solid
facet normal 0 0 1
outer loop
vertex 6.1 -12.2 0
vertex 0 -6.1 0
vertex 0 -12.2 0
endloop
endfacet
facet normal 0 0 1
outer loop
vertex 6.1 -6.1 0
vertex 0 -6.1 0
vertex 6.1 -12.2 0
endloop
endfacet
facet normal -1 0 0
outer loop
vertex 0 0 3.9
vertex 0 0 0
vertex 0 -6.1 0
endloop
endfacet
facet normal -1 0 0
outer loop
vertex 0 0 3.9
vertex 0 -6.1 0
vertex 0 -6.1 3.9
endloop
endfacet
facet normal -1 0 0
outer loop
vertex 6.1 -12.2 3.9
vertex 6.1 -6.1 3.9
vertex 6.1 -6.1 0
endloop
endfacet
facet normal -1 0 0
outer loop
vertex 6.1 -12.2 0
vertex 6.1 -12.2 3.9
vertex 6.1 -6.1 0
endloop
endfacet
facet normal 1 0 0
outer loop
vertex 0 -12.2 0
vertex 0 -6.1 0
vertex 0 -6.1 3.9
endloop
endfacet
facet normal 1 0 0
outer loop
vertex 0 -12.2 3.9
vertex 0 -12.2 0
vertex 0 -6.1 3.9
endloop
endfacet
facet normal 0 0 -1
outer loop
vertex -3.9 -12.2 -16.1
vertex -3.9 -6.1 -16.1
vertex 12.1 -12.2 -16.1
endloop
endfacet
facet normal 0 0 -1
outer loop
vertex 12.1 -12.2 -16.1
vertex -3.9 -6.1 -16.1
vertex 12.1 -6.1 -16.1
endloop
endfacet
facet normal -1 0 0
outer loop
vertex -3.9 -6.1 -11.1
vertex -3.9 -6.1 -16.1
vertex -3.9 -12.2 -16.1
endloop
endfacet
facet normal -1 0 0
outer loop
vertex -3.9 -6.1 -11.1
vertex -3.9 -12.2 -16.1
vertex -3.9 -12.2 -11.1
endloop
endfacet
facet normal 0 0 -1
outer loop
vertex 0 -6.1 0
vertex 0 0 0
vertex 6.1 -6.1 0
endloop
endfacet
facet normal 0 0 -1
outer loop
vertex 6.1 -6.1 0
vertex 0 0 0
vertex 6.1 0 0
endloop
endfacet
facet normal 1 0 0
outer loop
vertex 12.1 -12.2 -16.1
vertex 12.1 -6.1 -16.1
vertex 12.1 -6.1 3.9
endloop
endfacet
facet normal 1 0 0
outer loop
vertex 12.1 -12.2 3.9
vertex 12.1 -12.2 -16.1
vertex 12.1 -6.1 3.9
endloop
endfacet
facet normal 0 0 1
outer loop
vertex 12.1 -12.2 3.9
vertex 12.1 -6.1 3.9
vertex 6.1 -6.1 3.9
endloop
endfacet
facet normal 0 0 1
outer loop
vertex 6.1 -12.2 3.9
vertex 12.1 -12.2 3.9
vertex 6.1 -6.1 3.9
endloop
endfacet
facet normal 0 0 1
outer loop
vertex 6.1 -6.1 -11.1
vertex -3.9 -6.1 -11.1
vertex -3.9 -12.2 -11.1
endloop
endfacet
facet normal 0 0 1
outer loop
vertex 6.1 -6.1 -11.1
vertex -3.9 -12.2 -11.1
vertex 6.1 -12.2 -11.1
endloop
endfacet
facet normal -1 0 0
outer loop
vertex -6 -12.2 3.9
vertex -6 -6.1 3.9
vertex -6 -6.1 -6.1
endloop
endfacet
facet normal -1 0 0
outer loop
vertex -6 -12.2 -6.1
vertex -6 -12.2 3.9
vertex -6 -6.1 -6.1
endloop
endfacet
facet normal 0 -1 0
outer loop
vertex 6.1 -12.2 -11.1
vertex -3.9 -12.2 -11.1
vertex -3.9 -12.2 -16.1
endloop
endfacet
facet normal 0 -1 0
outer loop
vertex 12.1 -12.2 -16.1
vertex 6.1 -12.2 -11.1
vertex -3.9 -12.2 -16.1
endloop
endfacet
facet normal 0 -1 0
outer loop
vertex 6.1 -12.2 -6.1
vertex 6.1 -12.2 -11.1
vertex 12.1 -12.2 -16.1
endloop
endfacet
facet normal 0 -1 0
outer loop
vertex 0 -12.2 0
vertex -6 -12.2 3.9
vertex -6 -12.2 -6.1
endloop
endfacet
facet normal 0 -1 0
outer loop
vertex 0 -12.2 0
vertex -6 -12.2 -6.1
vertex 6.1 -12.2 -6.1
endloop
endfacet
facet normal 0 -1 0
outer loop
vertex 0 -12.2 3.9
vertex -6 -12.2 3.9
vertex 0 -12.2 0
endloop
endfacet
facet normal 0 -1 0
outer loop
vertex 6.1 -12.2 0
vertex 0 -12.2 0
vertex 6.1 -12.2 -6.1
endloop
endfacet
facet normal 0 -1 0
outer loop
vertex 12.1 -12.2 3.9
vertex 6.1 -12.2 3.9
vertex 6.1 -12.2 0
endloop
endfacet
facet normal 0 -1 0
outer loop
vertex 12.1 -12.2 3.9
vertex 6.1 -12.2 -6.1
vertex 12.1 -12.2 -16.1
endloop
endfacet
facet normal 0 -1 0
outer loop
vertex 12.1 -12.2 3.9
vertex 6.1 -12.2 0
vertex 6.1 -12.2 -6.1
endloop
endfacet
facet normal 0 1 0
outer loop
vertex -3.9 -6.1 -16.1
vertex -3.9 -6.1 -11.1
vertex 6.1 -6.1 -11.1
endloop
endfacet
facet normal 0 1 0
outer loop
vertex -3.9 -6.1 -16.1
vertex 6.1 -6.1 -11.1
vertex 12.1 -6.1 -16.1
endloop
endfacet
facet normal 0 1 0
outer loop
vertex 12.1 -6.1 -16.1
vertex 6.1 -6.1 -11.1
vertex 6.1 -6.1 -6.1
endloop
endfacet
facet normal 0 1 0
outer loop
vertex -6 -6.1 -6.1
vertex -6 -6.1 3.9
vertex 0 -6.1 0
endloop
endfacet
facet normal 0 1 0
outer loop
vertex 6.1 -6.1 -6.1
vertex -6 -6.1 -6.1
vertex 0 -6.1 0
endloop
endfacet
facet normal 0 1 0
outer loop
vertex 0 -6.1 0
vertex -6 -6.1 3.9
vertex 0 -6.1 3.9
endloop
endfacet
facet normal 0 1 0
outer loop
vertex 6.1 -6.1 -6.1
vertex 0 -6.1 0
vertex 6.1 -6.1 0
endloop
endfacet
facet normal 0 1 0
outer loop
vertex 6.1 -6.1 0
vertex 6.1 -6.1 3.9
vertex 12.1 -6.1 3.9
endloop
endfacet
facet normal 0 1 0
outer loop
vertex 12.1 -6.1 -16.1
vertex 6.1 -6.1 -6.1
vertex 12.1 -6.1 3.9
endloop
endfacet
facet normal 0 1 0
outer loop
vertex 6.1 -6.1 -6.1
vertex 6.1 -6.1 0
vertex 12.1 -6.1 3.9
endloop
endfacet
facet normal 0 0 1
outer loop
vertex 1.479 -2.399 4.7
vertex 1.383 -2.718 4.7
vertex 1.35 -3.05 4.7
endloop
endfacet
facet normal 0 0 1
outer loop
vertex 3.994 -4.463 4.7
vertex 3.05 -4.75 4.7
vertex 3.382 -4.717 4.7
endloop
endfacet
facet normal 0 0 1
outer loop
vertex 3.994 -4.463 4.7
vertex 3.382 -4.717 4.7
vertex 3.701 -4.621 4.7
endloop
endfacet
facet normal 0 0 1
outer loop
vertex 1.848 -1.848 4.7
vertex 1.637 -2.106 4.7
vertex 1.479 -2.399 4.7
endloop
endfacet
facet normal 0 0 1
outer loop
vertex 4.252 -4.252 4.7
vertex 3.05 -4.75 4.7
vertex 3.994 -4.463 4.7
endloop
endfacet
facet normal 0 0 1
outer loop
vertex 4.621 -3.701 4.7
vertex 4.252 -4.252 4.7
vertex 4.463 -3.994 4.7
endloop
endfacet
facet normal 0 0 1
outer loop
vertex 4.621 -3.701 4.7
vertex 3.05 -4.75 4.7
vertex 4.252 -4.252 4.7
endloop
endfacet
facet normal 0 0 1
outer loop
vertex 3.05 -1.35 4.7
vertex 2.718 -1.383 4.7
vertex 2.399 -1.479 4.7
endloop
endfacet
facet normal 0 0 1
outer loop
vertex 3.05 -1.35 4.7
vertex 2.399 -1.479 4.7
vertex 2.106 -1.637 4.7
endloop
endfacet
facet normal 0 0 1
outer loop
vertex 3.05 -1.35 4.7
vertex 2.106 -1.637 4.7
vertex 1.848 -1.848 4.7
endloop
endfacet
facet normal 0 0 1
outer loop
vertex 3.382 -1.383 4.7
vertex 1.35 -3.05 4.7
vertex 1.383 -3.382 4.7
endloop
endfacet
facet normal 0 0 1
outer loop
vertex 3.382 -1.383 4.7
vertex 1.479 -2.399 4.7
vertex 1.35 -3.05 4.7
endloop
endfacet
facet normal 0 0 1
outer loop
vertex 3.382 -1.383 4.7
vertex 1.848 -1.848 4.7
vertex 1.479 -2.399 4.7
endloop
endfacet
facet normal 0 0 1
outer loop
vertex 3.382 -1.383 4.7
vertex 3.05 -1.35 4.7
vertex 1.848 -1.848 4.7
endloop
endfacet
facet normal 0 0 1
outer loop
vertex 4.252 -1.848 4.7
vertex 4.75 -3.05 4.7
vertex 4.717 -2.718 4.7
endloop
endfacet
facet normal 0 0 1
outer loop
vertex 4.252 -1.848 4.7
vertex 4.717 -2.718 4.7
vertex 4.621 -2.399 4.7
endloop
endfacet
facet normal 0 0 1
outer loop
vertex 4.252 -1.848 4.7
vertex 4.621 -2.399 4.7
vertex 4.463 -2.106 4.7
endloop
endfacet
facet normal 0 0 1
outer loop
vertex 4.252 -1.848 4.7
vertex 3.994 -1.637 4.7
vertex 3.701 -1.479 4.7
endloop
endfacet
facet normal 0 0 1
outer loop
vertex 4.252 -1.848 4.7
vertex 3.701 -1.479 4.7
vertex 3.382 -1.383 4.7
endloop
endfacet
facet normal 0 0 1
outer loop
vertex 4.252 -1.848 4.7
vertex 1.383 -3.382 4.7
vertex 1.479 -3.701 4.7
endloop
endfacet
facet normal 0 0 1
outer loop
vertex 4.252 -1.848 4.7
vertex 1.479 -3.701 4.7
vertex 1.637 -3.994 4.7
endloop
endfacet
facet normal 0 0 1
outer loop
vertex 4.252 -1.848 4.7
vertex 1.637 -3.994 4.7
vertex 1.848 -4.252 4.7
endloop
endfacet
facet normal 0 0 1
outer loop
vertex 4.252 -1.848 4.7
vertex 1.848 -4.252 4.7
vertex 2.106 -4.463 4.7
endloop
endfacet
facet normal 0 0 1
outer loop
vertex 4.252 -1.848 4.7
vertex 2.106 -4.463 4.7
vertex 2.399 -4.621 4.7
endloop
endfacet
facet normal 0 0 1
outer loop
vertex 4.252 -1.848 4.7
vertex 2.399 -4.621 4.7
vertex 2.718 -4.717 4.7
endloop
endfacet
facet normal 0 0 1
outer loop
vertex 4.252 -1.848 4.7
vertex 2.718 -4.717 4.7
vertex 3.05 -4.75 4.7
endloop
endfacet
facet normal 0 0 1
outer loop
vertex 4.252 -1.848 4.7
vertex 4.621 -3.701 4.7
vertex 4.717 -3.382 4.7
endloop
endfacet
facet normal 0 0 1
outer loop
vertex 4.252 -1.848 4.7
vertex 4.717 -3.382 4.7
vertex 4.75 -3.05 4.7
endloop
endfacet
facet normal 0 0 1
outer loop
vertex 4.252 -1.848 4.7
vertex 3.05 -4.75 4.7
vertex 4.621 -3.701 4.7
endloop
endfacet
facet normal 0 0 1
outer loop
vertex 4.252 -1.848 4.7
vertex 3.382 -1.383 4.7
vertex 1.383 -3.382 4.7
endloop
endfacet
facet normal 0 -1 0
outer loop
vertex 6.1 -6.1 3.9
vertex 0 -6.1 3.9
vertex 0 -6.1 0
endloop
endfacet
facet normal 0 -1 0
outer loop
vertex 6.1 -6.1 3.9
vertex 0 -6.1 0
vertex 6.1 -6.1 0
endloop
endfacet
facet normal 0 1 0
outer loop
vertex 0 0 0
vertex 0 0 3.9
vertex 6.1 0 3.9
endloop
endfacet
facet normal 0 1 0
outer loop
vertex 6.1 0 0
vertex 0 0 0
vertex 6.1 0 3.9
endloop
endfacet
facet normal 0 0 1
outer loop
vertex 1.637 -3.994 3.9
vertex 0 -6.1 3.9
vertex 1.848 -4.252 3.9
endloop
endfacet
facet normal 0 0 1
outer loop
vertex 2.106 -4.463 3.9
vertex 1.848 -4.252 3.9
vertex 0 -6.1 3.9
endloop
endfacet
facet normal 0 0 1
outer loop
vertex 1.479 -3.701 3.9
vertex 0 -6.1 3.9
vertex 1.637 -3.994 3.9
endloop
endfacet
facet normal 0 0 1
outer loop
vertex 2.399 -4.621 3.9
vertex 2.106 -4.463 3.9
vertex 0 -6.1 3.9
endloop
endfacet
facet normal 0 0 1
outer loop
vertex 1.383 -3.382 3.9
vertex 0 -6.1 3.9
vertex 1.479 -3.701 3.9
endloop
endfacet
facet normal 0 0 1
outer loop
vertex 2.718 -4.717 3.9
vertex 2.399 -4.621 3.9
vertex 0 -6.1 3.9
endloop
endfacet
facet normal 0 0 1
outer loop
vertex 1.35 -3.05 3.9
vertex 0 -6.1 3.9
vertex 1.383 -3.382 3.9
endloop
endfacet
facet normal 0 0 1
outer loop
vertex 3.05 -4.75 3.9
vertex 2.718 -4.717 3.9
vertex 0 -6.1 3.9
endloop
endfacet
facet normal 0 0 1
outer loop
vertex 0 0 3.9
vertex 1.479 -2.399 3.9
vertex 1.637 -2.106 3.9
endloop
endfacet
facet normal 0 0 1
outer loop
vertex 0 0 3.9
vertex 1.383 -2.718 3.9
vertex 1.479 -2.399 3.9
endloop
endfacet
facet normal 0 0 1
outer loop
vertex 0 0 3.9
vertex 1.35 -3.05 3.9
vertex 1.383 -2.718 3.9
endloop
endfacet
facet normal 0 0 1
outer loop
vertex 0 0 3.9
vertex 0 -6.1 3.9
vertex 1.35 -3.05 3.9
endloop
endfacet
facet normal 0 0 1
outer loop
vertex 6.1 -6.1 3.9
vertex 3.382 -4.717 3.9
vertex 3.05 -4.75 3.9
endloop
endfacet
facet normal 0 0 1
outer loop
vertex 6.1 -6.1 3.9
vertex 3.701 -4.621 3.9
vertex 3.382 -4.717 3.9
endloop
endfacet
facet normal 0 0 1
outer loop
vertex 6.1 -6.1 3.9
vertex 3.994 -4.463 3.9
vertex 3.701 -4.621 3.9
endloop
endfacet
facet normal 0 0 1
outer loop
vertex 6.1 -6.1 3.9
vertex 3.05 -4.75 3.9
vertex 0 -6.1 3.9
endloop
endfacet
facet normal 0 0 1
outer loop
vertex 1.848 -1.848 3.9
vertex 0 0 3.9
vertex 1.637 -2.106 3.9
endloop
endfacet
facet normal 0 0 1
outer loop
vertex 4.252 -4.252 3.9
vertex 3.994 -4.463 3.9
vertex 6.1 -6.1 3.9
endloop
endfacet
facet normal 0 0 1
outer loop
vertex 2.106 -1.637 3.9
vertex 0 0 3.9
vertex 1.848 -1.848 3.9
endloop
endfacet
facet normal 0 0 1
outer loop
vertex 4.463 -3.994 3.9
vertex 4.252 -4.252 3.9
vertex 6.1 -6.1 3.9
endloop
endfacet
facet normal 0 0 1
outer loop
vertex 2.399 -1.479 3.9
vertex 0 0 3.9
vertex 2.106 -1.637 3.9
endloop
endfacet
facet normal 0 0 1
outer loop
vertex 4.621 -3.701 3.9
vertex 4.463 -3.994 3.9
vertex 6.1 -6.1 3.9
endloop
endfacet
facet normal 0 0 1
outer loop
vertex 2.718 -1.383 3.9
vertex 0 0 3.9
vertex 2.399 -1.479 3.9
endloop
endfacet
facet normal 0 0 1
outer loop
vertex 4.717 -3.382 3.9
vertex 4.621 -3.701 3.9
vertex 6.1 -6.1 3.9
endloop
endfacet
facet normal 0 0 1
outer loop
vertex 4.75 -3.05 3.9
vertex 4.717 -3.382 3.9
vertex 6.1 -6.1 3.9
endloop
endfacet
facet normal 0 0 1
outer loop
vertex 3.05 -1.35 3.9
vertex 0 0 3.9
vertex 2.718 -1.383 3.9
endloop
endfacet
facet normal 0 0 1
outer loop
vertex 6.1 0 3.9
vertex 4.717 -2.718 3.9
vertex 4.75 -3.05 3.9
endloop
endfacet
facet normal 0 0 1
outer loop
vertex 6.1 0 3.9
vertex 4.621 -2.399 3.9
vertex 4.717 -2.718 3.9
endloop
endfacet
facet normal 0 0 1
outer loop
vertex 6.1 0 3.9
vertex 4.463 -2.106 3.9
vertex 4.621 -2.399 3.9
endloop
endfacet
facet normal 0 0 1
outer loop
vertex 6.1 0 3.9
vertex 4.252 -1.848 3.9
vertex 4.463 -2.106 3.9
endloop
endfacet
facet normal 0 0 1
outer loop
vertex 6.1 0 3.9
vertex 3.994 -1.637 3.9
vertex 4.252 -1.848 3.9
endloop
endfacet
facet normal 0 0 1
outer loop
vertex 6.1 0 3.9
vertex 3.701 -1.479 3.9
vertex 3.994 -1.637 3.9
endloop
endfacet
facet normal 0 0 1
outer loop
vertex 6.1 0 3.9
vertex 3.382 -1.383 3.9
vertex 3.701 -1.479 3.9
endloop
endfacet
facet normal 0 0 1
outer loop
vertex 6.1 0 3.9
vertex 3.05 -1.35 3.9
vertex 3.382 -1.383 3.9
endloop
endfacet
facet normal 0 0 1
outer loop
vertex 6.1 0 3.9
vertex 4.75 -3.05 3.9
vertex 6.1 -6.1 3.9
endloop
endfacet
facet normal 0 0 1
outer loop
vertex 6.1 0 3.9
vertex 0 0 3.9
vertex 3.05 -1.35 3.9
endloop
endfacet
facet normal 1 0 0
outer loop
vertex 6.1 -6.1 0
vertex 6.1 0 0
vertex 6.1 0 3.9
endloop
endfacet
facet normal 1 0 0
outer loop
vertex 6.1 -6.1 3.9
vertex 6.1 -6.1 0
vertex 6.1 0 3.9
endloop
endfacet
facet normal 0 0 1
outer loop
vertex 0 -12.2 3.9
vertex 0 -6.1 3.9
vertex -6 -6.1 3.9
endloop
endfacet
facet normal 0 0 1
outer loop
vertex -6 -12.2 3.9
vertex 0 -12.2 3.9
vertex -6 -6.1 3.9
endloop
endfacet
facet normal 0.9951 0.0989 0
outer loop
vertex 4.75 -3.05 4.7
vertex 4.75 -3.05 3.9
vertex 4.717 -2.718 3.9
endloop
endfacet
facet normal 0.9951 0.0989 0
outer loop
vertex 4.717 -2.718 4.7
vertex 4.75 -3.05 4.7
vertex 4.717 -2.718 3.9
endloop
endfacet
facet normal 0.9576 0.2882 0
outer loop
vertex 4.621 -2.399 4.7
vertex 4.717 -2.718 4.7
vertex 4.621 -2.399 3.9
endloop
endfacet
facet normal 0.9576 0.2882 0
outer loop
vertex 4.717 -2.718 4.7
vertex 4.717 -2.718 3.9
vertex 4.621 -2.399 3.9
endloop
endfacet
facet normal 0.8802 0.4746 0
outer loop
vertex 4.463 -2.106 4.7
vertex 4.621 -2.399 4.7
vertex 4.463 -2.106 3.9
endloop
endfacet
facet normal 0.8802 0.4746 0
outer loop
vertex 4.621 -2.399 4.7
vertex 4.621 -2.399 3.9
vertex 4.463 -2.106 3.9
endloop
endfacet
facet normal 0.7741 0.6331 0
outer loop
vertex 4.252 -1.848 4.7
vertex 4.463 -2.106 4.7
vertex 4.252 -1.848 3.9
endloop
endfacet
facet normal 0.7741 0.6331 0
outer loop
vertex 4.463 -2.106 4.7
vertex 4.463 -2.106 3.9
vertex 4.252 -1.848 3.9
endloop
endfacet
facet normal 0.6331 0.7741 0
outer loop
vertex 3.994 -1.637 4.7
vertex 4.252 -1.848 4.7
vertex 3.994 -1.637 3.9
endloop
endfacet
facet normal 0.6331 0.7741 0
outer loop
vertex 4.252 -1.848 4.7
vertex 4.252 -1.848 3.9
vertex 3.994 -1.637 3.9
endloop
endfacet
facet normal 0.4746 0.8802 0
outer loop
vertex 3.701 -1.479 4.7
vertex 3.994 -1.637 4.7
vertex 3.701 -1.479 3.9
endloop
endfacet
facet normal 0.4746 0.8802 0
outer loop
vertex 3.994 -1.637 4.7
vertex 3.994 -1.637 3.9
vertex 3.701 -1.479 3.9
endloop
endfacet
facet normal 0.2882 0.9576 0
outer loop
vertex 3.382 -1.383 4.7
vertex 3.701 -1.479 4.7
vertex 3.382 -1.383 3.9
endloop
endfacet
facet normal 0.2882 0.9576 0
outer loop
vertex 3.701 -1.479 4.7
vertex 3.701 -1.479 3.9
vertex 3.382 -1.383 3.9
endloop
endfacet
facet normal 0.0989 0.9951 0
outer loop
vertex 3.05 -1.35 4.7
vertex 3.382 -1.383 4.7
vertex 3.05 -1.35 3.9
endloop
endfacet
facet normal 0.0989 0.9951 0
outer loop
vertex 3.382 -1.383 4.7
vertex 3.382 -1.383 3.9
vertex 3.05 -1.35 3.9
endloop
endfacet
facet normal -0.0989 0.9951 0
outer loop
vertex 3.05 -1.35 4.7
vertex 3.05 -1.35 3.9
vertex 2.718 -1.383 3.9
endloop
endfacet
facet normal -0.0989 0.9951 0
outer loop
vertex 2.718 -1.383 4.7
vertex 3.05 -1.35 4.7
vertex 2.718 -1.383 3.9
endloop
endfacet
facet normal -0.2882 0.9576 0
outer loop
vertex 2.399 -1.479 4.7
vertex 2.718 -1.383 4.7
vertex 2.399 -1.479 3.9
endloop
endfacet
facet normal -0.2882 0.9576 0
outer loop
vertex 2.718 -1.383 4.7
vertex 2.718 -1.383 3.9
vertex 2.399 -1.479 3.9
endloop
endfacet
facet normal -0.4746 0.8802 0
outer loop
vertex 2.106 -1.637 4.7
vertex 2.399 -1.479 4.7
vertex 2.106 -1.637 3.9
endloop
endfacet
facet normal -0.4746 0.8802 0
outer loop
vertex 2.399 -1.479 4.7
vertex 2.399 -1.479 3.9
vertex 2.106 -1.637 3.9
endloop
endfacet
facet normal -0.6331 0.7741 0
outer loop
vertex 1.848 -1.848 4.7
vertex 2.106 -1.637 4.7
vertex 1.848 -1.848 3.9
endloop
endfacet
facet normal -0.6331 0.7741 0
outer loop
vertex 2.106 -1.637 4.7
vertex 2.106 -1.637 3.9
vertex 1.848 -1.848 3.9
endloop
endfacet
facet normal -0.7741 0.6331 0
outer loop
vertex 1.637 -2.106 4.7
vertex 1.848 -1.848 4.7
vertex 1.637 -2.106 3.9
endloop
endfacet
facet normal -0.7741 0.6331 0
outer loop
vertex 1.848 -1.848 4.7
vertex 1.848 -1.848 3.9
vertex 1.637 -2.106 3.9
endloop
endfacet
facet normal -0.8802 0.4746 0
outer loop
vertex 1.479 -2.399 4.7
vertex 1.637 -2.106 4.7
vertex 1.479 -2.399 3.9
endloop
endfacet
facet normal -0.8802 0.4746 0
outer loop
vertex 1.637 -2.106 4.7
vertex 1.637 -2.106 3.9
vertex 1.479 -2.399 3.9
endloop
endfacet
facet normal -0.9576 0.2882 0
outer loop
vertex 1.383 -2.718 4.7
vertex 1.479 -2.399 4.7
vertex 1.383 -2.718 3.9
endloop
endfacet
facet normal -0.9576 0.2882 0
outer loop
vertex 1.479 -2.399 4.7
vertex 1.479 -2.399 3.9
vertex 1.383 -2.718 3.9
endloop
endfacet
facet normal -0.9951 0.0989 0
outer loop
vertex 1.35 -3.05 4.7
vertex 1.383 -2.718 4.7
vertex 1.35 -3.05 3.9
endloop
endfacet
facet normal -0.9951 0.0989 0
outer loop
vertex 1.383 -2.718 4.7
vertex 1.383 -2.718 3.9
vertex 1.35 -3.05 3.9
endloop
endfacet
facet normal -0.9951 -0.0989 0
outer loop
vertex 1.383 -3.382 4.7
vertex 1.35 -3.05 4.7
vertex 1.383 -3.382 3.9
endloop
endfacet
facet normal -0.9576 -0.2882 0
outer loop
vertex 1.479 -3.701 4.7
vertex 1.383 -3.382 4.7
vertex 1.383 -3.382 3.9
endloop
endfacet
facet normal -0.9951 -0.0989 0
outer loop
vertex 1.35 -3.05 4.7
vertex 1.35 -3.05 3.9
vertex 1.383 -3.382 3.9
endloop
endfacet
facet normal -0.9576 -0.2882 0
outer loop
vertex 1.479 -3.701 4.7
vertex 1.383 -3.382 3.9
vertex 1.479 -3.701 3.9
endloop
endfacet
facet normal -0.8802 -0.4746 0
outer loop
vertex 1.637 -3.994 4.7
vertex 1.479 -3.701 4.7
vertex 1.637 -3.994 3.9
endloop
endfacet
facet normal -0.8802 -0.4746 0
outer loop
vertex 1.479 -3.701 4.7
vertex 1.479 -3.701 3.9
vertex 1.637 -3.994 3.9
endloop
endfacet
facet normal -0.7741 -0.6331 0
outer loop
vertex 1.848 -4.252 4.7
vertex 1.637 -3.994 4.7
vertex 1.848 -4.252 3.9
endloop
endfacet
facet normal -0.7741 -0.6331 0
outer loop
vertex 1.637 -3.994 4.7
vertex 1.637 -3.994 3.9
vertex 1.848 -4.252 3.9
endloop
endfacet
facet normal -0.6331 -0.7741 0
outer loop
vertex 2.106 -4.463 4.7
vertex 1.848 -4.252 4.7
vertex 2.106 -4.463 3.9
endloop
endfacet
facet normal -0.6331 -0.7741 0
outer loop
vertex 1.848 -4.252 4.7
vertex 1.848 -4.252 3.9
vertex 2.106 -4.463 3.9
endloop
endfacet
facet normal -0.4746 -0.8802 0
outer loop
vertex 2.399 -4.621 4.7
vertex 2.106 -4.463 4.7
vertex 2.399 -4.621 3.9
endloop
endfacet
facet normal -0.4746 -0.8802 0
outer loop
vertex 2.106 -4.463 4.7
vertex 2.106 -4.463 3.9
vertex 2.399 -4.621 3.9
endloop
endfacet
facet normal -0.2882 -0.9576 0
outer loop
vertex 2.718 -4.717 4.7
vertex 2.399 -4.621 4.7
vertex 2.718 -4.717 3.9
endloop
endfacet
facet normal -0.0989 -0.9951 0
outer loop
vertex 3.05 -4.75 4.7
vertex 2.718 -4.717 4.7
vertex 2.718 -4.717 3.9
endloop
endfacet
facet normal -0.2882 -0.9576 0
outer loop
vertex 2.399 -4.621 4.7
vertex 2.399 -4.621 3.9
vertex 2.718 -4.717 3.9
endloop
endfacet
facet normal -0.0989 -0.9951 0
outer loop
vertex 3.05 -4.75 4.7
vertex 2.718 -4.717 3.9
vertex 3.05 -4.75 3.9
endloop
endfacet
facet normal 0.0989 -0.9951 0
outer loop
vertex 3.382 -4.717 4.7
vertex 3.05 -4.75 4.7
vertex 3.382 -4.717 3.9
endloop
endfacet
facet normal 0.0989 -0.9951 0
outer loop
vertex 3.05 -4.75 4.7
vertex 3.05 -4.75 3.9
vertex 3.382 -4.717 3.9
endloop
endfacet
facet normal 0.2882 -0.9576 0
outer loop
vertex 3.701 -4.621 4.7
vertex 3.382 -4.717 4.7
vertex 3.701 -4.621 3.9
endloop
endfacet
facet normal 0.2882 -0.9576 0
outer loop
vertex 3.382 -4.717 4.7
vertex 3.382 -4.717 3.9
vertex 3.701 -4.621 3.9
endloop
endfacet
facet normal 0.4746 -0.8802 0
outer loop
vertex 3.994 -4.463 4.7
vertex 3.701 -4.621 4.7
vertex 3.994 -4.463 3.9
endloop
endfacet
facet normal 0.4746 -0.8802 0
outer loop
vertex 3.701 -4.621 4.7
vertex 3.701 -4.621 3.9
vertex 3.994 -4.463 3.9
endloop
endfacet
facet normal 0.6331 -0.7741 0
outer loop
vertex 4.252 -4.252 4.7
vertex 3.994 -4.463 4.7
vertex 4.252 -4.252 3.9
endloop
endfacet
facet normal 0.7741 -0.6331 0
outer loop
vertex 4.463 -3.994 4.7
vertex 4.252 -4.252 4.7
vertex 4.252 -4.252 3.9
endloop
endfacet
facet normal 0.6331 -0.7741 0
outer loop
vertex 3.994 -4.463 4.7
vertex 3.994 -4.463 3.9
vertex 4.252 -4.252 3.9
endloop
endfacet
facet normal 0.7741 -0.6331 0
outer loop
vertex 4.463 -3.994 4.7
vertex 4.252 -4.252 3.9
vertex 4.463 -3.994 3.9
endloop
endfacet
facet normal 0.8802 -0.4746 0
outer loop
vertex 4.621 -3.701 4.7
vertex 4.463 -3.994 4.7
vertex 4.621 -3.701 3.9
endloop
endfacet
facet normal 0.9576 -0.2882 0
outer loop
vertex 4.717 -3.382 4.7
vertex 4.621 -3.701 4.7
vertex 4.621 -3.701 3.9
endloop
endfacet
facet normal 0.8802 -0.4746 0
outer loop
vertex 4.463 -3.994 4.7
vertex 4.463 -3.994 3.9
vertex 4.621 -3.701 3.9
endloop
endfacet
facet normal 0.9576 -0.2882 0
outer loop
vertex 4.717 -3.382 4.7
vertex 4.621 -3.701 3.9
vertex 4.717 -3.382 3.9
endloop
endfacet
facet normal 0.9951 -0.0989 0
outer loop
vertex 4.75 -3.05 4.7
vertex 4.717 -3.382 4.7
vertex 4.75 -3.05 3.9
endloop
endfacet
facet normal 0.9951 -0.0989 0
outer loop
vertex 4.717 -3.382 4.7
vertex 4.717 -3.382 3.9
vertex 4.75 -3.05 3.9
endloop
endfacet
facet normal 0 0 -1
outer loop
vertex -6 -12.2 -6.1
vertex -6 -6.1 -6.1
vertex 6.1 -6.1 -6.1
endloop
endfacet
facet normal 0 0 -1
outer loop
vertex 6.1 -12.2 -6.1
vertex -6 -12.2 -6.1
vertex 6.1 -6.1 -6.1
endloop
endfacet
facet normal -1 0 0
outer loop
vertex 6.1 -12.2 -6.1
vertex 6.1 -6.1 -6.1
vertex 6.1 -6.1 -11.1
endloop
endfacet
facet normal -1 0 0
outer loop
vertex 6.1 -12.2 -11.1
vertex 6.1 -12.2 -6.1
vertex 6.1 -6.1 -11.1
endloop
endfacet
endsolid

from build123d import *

# Parameters (mm, degrees)
F0_W     = 6.1
F0_H     = 3.9
F1_DEPTH = 6.1
F2_R     = 1.7
F3_DEPTH = 0.8
F4_W     = 6.1
F4_H     = 6.1
F4_W_2   = 10
F4_H_2   = 5
F5_DEPTH = 6.1


with BuildPart() as f1:
    # F0 (on Front) → F1 (new body)
    with BuildSketch(Plane.XZ):
        with Locations((3.05, 1.95)):
            Rectangle(F0_W, F0_H)
    extrude(amount=F1_DEPTH)

    # F2 (on face) → F3 (join)
    with BuildSketch(Plane.XY.offset(3.9)):
        with Locations((3.05, -3.05)):
            Circle(F2_R)
    extrude(amount=F3_DEPTH)


with BuildPart() as f5:
    # F4 (on face) → F5 (new body)
    with BuildSketch(Plane.XZ.offset(6.1)):
        Polygon((0, 0), (0, 3.9), (-6, 3.9), (-6, -6.1), (0, -6.1), align=None)
        with Locations((3.05, -3.05)):
            Rectangle(F4_W, F4_H)
        Polygon((6.1, 3.9), (6.1, 0), (6.1, -6.1), (12.1, -6.1), (12.1, 3.9), align=None)
        Polygon((12.1, -6.1), (6.1, -6.1), (6.1, -11.1), (6.1, -16.1), (12.1, -16.1), align=None)
        with Locations((1.1, -13.6)):
            Rectangle(F4_W_2, F4_H_2)
    extrude(amount=F5_DEPTH)


solid = Compound([f1.part, f5.part])
